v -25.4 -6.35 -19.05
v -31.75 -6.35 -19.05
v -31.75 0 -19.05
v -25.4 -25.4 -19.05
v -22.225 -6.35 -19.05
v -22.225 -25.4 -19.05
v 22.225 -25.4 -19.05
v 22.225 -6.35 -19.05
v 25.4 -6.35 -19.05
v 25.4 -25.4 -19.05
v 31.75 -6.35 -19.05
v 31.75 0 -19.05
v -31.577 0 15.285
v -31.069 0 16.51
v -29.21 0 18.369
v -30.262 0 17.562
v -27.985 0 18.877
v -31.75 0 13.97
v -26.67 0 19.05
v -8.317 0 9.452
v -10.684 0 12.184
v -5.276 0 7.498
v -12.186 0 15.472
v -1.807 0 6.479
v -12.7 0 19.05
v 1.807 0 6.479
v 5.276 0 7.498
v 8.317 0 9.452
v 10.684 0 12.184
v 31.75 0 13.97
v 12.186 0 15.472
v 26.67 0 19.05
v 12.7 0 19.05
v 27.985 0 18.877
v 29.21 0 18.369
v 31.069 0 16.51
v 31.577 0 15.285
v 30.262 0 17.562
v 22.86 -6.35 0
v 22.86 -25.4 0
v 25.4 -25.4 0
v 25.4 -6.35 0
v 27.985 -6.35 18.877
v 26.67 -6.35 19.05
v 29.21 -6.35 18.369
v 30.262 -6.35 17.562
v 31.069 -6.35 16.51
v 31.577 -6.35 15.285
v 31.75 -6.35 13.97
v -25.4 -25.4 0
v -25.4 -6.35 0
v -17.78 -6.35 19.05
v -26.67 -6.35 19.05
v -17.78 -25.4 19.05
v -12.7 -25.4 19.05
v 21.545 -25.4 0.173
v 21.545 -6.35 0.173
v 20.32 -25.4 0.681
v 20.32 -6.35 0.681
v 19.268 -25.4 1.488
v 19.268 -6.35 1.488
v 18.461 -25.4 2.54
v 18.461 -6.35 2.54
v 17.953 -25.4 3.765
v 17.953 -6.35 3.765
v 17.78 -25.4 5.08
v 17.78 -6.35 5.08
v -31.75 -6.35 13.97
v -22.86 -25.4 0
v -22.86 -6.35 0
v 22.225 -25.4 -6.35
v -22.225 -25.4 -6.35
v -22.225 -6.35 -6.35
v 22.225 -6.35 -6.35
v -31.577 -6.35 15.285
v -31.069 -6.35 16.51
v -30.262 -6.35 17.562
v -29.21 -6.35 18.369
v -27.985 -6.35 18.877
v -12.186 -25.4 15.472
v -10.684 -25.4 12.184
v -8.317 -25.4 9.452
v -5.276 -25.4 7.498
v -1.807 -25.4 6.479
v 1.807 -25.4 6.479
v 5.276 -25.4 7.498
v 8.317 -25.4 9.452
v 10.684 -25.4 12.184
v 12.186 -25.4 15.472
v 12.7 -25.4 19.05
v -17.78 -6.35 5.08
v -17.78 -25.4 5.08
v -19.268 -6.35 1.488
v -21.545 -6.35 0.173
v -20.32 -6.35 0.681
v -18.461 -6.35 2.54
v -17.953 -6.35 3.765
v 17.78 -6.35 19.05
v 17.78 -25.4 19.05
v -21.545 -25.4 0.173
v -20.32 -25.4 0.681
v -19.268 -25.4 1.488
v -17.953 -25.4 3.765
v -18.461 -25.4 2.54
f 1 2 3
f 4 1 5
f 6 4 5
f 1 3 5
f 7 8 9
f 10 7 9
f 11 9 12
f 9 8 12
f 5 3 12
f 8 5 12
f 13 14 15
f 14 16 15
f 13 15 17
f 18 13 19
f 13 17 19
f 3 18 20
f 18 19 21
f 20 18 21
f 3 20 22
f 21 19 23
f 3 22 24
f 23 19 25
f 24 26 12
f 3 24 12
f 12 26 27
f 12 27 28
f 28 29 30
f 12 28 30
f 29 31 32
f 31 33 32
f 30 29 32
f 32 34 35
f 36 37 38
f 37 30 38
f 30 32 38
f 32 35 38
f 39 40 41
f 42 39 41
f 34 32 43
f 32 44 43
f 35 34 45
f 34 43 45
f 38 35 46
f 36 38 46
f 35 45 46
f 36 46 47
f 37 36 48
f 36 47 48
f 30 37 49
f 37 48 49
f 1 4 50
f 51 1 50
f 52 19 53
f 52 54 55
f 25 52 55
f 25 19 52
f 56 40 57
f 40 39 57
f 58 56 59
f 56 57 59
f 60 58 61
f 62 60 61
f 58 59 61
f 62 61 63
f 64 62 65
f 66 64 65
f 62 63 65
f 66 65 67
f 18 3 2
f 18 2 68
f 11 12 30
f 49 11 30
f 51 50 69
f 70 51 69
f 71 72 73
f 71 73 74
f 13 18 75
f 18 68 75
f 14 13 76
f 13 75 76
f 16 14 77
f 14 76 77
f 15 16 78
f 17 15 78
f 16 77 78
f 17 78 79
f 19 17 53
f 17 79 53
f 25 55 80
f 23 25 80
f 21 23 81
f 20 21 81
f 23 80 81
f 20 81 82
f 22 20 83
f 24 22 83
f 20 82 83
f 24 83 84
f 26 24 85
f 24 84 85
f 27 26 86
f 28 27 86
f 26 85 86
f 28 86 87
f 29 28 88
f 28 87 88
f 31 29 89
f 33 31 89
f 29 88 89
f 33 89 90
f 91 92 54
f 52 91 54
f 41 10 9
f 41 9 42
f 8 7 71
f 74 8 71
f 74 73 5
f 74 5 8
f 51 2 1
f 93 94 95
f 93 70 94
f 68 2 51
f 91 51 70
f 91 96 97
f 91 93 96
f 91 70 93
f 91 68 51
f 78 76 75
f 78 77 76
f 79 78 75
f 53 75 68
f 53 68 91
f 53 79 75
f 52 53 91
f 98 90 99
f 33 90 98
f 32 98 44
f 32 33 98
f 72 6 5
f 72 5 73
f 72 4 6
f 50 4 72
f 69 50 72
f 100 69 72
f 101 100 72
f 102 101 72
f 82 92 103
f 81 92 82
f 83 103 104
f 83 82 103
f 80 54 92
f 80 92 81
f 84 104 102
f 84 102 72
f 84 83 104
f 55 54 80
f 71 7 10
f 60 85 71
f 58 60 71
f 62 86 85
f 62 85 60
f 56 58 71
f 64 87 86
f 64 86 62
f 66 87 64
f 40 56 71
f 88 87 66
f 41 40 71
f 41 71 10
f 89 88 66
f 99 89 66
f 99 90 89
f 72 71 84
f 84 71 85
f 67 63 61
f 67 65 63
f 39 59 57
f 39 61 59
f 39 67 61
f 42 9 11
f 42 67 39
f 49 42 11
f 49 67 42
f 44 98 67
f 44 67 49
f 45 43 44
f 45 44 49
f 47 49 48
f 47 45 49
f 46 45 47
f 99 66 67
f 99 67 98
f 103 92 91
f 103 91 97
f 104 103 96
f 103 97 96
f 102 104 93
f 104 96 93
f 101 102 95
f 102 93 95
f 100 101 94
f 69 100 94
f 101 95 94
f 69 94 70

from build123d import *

# Parameters (mm, degrees)
F0_W      = 63.5
F0_H      = 38.1
F1_DEPTH  = 25.4
F3_DEPTH  = 38.1
F4_W      = 44.45
F4_H      = 12.7
F5_DEPTH  = 19.05
F6_W      = 6.35
F6_H      = 38.1
F7_DEPTH  = 19.05
F8_W      = 6.35
F8_H      = 38.1
F9_DEPTH  = 19.05
F10_R     = 5.08
F11_W     = 7.62
F11_H     = 19.05
F12_DEPTH = 19.05
F13_R     = 5.08
F14_W     = 7.62
F14_H     = 19.05
F15_DEPTH = 19.05
F16_R     = 5.08


with BuildPart() as f1:
    # F0 (on Front) → F1 (new body)
    with BuildSketch(Plane.XZ):
        Rectangle(F0_W, F0_H)
    extrude(amount=F1_DEPTH)

    # F2 (on face) → F3 (cut)
    with BuildSketch(Plane.XZ.offset(25.4)):
        with BuildLine():
            Line((12.7, 19.05), (-12.7, 19.05))
            ThreePointArc((-12.7, 19.05), (0, 6.35), (12.7, 19.05))
        make_face()
    extrude(amount=-F3_DEPTH, mode=Mode.SUBTRACT)

    # F4 (on face) → F5 (cut)
    with BuildSketch(Plane.XZ.offset(25.4)):
        with Locations((0, -12.7)):
            Rectangle(F4_W, F4_H)
    extrude(amount=-F5_DEPTH, mode=Mode.SUBTRACT)

    # F6 (on face) → F7 (cut)
    with BuildSketch(Plane.XZ.offset(25.4)):
        with Locations((-28.575, 0)):
            Rectangle(F6_W, F6_H)
    extrude(amount=-F7_DEPTH, mode=Mode.SUBTRACT)

    # F8 (on face) → F9 (cut)
    with BuildSketch(Plane.XZ.offset(25.4)):
        with Locations((28.575, 0)):
            Rectangle(F8_W, F8_H)
    extrude(amount=-F9_DEPTH, mode=Mode.SUBTRACT)

    # F10
    f10_edges = [f1.edges().sort_by_distance(p)[0] for p in [
        (31.75, -3.175, 19.05),
        (-31.75, -3.175, 19.05),
    ]]
    fillet(f10_edges, radius=F10_R)

    # F11 (on face) → F12 (cut)
    with BuildSketch(Plane.XZ.offset(25.4)):
        with Locations((-21.59, 9.525)):
            Rectangle(F11_W, F11_H)
    extrude(amount=-F12_DEPTH, mode=Mode.SUBTRACT)

    # F13
    f13_edges = [f1.edges().sort_by_distance(p)[0] for p in [
        (-17.78, -15.875, 0),
    ]]
    fillet(f13_edges, radius=F13_R)

    # F14 (on face) → F15 (cut)
    with BuildSketch(Plane.XZ.offset(25.4)):
        with Locations((21.59, 9.525)):
            Rectangle(F14_W, F14_H)
    extrude(amount=-F15_DEPTH, mode=Mode.SUBTRACT)

    # F16
    f16_edges = [f1.edges().sort_by_distance(p)[0] for p in [
        (17.78, -15.875, 0),
    ]]
    fillet(f16_edges, radius=F16_R)


solid = f1.part
